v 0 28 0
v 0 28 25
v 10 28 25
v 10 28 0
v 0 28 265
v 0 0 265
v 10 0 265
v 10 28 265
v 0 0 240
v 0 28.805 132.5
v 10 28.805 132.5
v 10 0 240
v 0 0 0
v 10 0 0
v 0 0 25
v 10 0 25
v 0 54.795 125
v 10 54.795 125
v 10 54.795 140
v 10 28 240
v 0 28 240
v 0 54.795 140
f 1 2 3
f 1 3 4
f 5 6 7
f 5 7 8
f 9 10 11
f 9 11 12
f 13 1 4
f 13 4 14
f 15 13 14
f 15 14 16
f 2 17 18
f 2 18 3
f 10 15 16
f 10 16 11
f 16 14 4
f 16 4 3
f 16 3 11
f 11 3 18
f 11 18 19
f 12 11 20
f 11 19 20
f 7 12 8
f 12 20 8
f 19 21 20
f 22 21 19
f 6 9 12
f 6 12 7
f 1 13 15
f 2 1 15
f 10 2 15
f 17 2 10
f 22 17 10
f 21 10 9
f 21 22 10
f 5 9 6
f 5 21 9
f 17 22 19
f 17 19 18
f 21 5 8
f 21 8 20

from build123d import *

# Parameters (mm, degrees)
BOSS_EXTRUDE1_DEPTH = 10


with BuildPart() as part:
    # Sketch1 → Boss-Extrude1 (new body)
    with BuildSketch(Plane(origin=(0, 0, 0), x_dir=(0, 0, -1), z_dir=(1, 0, 0))):
        Polygon((0, 0), (-25, 0), (-132.5, 28.804538186), (-240, 0), (-265, 0), (-265, 28), (-240, 28), (-140, 54.794919243), (-125, 54.794919243), (-25, 28), (0, 28), align=None)
    extrude(amount=BOSS_EXTRUDE1_DEPTH)


solid = part.part
